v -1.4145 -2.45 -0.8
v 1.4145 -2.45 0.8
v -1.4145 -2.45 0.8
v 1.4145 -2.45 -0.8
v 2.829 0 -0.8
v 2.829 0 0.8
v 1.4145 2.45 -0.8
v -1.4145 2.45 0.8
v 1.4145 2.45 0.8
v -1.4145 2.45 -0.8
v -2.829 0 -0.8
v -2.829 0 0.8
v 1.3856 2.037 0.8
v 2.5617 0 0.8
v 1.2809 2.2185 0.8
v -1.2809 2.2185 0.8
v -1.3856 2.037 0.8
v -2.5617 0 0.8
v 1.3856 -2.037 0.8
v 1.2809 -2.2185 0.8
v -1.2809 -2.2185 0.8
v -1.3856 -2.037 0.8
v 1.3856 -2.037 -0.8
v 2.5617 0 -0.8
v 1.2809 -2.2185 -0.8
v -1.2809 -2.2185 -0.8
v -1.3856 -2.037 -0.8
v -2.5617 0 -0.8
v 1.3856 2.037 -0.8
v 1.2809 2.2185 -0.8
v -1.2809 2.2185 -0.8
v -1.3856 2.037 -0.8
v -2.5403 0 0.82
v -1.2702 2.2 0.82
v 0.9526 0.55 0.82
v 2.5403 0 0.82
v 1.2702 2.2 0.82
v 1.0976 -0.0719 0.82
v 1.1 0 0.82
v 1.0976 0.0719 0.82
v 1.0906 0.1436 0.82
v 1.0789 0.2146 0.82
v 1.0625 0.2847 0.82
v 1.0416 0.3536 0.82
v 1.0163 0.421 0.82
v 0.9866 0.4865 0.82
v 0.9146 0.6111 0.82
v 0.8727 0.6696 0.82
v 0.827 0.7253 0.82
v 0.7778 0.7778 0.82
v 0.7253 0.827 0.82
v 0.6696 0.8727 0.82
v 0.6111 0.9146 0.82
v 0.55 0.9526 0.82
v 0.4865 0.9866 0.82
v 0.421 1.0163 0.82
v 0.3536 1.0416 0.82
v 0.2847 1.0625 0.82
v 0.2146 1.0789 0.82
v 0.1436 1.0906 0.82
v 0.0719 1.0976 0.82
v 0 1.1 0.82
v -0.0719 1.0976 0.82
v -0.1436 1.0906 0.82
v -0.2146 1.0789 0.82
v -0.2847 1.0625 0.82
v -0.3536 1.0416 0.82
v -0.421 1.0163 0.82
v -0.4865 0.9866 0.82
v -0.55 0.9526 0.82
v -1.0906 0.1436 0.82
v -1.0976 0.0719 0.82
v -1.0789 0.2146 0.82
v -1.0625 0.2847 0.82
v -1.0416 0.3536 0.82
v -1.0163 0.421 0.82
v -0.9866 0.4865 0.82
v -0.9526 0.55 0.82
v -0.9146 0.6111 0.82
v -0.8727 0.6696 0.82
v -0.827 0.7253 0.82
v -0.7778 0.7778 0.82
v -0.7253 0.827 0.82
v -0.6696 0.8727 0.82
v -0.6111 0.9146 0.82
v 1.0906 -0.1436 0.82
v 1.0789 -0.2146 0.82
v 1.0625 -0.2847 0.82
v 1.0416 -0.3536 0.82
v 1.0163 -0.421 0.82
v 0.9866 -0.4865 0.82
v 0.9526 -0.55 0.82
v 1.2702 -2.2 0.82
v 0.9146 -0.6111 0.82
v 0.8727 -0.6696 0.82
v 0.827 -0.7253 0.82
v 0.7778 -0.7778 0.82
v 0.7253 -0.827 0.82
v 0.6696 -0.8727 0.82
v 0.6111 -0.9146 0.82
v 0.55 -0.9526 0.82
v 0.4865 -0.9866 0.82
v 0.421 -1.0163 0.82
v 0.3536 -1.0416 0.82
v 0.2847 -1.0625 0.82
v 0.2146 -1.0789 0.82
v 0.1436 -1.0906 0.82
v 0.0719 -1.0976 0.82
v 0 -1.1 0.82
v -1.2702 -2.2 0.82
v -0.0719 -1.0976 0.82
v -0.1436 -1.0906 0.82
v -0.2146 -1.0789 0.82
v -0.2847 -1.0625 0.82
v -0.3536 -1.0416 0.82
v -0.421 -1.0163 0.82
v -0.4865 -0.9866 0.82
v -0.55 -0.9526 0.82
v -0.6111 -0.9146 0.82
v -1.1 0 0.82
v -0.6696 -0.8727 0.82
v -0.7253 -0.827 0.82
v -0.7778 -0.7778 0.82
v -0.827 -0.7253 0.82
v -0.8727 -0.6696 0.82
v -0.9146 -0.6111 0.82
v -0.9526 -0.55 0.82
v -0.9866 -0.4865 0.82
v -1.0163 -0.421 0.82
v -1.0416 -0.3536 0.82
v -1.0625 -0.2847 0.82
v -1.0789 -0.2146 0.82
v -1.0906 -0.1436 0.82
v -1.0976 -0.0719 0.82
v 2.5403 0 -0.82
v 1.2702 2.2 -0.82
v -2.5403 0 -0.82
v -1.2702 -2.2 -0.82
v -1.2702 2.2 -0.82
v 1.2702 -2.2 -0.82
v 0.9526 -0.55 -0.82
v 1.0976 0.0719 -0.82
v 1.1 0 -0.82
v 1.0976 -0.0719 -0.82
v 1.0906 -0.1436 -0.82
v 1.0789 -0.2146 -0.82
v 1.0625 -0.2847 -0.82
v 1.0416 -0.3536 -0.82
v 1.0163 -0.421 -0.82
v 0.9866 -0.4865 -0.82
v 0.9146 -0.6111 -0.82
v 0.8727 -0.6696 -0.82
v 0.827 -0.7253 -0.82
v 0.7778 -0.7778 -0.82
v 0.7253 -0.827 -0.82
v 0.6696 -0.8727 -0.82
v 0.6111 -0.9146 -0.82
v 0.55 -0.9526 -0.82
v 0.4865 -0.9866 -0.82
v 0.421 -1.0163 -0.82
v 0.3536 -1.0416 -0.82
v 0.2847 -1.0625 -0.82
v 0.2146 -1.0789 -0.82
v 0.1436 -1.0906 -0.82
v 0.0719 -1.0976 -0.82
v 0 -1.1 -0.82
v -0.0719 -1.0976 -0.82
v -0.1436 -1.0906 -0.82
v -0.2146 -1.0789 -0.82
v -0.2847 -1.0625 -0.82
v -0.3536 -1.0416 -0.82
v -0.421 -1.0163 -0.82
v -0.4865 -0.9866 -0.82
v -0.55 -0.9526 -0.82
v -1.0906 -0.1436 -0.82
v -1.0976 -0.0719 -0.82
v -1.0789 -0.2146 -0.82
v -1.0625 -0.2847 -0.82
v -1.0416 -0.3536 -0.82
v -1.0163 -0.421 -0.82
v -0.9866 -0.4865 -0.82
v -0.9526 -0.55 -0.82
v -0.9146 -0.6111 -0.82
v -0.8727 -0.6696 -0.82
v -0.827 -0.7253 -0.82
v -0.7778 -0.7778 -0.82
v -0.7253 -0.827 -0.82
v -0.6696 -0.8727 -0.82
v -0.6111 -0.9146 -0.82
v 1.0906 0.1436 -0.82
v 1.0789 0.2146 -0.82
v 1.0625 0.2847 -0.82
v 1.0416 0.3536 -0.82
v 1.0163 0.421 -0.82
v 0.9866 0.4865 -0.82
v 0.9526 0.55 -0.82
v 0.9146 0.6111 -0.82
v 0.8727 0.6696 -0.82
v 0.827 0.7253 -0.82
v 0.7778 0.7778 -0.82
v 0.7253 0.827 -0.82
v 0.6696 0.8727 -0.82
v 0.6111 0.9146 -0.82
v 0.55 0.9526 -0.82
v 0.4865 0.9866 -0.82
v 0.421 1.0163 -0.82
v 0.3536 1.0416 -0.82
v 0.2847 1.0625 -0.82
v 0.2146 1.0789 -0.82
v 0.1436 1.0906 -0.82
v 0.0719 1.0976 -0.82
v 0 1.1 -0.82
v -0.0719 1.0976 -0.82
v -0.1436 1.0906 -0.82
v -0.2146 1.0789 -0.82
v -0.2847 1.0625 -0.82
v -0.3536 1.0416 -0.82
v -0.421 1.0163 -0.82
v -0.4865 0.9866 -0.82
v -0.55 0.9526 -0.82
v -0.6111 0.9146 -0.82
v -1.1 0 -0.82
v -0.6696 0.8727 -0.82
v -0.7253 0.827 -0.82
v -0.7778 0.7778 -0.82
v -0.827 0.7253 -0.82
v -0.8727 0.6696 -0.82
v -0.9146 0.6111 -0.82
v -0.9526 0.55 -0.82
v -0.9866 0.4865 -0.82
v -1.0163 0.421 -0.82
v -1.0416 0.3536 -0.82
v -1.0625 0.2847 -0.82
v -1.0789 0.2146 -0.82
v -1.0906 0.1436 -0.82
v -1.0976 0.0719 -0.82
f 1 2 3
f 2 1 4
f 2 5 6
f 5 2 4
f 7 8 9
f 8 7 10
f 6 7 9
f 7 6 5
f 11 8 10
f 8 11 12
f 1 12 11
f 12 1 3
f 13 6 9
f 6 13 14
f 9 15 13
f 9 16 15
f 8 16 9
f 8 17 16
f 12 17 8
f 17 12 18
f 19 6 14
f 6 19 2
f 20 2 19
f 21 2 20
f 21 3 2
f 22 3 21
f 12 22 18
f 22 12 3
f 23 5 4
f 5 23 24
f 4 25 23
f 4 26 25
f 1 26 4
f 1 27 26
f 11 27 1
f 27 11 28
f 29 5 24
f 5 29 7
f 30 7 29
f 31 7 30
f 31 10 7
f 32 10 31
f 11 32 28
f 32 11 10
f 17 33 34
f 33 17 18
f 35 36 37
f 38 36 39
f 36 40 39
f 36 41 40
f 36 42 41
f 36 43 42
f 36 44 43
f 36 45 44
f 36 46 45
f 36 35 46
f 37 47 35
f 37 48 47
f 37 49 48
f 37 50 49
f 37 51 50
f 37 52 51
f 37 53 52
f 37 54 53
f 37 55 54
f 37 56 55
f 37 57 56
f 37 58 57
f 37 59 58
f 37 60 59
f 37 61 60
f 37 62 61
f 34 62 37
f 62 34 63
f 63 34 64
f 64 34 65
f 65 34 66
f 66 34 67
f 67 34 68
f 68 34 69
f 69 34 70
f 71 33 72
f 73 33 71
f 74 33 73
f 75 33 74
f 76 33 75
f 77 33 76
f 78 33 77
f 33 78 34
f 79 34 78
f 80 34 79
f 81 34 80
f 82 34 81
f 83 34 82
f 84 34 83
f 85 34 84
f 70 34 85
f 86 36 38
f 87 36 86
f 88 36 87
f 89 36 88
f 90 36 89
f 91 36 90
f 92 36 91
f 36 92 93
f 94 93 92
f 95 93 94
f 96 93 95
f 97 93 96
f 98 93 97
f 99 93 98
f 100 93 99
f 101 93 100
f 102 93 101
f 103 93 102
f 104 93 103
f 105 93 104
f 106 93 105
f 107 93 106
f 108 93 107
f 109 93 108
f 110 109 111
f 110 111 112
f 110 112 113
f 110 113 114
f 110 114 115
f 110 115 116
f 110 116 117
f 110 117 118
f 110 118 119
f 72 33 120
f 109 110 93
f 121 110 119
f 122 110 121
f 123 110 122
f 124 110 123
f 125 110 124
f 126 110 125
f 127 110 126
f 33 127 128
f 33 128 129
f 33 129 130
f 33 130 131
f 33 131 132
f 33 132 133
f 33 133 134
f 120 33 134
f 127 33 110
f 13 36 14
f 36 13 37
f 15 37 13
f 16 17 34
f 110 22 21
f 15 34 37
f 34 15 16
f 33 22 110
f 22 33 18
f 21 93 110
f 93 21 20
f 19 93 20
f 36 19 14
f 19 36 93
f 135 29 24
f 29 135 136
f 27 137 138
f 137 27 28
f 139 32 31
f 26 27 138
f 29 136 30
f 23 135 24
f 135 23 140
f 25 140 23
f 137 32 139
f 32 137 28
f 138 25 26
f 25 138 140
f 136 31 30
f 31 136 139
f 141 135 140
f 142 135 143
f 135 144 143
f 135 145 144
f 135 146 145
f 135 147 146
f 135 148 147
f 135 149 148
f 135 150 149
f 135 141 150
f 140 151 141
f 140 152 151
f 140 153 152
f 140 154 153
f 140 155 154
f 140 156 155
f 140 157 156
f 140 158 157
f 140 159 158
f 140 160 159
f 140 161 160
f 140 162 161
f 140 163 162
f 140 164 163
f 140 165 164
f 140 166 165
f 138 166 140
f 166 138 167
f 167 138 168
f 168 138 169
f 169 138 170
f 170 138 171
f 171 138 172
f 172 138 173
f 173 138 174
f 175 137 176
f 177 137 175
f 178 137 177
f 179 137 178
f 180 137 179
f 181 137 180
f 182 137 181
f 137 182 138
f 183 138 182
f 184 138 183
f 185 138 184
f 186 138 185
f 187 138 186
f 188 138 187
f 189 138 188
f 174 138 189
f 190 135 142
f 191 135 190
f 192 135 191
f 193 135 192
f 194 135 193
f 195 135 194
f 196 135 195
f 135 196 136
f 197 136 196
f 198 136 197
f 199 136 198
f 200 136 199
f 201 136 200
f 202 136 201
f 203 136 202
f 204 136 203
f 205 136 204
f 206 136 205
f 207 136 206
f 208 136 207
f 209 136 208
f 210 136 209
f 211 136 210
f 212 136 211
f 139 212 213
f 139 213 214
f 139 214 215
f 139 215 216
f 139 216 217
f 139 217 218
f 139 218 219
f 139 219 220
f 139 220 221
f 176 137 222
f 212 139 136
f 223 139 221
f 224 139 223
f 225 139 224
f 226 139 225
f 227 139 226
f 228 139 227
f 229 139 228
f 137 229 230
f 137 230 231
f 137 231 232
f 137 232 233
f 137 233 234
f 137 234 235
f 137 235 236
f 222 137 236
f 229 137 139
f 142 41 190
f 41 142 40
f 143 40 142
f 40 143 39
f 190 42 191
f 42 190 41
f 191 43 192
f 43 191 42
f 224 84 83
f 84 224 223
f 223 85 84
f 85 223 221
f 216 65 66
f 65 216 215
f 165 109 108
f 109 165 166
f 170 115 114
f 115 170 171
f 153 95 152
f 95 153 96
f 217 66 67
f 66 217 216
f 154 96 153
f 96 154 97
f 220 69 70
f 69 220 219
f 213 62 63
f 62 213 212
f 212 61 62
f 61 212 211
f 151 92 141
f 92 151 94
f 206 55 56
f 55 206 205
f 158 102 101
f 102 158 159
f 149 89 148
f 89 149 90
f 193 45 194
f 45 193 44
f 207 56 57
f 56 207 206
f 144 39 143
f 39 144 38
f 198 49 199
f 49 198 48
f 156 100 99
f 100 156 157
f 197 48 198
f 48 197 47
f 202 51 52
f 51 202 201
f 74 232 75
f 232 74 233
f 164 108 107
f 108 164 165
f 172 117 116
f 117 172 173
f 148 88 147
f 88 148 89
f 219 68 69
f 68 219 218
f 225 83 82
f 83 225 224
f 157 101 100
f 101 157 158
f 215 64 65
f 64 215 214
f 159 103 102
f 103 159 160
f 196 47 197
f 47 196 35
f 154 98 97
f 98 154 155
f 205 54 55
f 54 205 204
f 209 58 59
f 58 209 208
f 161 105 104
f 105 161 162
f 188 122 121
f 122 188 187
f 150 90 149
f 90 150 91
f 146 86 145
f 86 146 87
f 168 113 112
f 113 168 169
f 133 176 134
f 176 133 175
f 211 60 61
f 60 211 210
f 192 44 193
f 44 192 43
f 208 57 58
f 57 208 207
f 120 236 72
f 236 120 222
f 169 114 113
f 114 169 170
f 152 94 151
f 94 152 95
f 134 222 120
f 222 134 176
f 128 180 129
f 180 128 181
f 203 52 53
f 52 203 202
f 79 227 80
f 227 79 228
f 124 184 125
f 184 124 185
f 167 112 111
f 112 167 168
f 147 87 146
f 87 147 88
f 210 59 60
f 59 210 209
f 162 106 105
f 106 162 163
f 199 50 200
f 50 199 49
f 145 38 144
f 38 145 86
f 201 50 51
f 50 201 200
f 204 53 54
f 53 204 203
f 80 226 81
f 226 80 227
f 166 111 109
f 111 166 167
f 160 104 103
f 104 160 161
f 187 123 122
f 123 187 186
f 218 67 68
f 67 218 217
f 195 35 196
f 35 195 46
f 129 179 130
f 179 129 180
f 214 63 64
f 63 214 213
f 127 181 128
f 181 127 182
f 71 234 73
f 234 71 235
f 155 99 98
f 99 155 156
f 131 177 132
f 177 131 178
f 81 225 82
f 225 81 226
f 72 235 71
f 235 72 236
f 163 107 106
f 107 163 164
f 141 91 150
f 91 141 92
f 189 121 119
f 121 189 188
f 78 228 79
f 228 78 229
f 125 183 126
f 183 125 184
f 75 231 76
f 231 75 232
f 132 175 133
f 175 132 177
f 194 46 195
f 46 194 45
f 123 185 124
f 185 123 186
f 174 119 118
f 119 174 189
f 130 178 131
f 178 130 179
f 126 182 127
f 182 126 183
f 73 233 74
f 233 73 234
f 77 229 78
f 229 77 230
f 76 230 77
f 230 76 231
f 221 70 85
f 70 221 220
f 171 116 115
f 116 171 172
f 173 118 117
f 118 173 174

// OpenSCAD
$fn = 96;

// Target dimensions
af = 4.9;          // across flats (mm)
thk = 1.6;         // thickness (mm)
screw_d = 2.0;     // nominal screw diameter (mm)

// Practical clearances / details
hole_d = screw_d + 0.2;   // clearance for M2 (mm)
chamfer_h = 0.25;         // lead-in height per side (mm)
chamfer_inset = 0.25;     // how much the chamfer pulls in from flats (mm)
eps = 0.02;

// Derived radii
r_outer = af / sqrt(3);                 // circumradius for hex with given across-flats
r_outer_ch = (af - 2*chamfer_inset) / sqrt(3);
r_hole = hole_d / 2;

module hex_prism(h, r) {
    cylinder(h=h, r=r, center=true, $fn=6);
}

module hex_nut() {
    difference() {
        union() {
            // Main body
            hex_prism(thk, r_outer);

            // Top chamfer (connected with slight overlap)
            translate([0, 0, thk/2 - chamfer_h/2 + eps/2])
                cylinder(h=chamfer_h + eps, r1=r_outer, r2=r_outer_ch, center=true, $fn=6);

            // Bottom chamfer (connected with slight overlap)
            translate([0, 0, -thk/2 + chamfer_h/2 - eps/2])
                cylinder(h=chamfer_h + eps, r1=r_outer_ch, r2=r_outer, center=true, $fn=6);
        }

        // Through-hole (extends beyond thickness to guarantee cut)
        cylinder(h=thk + 2*(chamfer_h + 1), r=r_hole, center=true);
    }
}

hex_nut();
